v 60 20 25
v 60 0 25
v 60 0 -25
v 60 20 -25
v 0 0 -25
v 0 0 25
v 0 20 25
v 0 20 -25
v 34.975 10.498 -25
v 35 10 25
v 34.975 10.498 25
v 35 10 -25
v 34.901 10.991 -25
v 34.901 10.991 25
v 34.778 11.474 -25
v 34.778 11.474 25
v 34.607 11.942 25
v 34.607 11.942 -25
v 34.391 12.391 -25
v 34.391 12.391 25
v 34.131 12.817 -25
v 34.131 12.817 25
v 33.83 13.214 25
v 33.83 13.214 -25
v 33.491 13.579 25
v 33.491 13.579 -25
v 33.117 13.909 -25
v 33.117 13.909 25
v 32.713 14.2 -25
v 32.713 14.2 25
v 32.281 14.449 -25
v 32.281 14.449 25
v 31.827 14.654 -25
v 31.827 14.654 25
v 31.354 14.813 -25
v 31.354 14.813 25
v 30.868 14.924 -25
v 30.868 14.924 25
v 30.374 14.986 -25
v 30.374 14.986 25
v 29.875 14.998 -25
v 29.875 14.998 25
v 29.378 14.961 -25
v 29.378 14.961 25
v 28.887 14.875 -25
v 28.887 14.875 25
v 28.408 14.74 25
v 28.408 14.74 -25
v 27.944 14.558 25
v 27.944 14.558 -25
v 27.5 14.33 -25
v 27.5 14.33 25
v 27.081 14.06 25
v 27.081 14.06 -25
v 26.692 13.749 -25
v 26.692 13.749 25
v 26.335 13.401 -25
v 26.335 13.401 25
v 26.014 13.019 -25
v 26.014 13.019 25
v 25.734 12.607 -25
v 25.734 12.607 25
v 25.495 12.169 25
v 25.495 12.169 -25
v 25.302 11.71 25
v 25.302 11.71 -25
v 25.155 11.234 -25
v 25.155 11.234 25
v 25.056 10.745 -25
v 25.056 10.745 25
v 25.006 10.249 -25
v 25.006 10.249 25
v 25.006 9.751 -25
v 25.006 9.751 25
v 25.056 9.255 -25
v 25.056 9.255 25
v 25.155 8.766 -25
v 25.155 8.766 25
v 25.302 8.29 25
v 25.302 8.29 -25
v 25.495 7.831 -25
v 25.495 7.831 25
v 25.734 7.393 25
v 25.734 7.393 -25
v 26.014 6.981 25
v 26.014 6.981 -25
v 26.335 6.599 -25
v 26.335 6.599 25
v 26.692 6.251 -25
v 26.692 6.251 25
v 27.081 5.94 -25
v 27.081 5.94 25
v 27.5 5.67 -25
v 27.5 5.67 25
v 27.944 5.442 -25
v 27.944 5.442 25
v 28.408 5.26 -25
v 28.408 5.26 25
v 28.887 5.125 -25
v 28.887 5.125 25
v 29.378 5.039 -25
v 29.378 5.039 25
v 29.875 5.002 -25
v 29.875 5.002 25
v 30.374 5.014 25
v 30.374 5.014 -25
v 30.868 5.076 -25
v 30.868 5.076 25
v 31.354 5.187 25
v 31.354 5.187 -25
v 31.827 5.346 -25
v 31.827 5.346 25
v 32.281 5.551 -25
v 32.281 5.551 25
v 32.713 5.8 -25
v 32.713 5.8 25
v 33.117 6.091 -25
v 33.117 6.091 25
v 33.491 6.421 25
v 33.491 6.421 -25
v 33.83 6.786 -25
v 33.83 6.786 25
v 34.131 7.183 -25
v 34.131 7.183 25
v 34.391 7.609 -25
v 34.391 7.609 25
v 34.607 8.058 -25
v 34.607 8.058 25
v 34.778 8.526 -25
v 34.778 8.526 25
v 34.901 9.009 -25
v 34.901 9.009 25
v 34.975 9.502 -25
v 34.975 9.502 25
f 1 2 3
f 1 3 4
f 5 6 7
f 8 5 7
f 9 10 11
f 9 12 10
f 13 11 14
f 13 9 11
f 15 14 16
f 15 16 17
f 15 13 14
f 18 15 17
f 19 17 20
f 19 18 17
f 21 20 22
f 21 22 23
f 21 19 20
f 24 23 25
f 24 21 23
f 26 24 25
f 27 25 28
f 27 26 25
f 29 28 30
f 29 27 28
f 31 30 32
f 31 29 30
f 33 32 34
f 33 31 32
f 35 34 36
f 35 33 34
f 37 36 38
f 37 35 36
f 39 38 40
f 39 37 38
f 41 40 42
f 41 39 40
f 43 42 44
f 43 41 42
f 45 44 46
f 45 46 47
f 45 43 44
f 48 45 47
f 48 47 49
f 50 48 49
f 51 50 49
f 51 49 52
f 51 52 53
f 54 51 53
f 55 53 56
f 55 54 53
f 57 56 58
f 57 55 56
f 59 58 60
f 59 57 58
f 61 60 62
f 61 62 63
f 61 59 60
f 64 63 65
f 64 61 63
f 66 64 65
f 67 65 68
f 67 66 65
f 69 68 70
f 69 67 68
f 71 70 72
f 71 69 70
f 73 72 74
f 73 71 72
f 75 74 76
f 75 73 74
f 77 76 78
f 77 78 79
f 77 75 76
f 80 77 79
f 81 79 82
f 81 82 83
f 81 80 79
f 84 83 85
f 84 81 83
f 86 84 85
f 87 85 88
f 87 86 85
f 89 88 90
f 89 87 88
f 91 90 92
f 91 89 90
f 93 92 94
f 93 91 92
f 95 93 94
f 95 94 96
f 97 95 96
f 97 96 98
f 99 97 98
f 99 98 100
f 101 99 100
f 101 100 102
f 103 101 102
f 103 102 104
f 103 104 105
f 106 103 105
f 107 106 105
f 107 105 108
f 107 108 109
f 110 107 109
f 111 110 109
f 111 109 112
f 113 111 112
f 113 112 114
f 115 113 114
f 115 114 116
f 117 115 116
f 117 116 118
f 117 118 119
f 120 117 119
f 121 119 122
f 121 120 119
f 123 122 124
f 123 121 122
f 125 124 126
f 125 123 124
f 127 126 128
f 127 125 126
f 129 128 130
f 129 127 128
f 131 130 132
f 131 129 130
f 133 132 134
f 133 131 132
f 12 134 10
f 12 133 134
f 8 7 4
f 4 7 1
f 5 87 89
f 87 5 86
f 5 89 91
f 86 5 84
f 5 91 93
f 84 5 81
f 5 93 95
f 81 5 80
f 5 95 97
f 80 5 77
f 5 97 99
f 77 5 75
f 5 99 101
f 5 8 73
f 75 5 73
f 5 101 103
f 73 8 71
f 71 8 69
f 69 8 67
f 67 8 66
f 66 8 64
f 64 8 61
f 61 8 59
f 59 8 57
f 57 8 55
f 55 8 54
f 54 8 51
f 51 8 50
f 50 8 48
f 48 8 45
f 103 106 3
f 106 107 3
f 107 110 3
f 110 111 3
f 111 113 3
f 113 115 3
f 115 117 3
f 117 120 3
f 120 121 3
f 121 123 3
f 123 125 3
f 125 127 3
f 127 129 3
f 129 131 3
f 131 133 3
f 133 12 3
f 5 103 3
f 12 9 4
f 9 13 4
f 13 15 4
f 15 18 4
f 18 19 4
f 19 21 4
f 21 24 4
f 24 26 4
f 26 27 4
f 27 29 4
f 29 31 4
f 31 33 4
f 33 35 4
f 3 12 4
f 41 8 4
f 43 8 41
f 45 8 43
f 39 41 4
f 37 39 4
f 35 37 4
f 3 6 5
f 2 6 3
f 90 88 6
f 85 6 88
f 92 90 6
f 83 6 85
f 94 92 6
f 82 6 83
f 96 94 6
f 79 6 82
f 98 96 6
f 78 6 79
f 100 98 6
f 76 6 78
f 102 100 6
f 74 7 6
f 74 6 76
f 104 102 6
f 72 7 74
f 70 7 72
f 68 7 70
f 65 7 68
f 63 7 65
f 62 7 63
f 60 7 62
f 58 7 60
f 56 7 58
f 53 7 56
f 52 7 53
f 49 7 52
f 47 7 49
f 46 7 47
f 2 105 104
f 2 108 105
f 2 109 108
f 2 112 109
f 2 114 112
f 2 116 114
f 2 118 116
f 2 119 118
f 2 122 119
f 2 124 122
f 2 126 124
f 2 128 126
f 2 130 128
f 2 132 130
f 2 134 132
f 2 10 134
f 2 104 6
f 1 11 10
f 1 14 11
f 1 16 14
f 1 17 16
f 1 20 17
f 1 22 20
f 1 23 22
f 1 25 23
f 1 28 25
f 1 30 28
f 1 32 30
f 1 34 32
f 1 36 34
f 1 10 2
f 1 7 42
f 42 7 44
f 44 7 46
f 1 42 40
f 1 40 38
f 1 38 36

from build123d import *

# Parameters (mm, degrees)
SKETCH_1_W      = 60
SKETCH_1_H      = 20
SKETCH_1_R      = 5
EXTRUDE_1_DEPTH = 25


with BuildPart() as part:
    # 草圖1 → 填料-伸長1 (new, symmetric)
    with BuildSketch(Plane.XY):
        with Locations((30, 10)):
            Rectangle(SKETCH_1_W, SKETCH_1_H)
        with Locations((30, 10)):
            Circle(SKETCH_1_R, mode=Mode.SUBTRACT)
    extrude(amount=EXTRUDE_1_DEPTH, both=True)


solid = part.part
